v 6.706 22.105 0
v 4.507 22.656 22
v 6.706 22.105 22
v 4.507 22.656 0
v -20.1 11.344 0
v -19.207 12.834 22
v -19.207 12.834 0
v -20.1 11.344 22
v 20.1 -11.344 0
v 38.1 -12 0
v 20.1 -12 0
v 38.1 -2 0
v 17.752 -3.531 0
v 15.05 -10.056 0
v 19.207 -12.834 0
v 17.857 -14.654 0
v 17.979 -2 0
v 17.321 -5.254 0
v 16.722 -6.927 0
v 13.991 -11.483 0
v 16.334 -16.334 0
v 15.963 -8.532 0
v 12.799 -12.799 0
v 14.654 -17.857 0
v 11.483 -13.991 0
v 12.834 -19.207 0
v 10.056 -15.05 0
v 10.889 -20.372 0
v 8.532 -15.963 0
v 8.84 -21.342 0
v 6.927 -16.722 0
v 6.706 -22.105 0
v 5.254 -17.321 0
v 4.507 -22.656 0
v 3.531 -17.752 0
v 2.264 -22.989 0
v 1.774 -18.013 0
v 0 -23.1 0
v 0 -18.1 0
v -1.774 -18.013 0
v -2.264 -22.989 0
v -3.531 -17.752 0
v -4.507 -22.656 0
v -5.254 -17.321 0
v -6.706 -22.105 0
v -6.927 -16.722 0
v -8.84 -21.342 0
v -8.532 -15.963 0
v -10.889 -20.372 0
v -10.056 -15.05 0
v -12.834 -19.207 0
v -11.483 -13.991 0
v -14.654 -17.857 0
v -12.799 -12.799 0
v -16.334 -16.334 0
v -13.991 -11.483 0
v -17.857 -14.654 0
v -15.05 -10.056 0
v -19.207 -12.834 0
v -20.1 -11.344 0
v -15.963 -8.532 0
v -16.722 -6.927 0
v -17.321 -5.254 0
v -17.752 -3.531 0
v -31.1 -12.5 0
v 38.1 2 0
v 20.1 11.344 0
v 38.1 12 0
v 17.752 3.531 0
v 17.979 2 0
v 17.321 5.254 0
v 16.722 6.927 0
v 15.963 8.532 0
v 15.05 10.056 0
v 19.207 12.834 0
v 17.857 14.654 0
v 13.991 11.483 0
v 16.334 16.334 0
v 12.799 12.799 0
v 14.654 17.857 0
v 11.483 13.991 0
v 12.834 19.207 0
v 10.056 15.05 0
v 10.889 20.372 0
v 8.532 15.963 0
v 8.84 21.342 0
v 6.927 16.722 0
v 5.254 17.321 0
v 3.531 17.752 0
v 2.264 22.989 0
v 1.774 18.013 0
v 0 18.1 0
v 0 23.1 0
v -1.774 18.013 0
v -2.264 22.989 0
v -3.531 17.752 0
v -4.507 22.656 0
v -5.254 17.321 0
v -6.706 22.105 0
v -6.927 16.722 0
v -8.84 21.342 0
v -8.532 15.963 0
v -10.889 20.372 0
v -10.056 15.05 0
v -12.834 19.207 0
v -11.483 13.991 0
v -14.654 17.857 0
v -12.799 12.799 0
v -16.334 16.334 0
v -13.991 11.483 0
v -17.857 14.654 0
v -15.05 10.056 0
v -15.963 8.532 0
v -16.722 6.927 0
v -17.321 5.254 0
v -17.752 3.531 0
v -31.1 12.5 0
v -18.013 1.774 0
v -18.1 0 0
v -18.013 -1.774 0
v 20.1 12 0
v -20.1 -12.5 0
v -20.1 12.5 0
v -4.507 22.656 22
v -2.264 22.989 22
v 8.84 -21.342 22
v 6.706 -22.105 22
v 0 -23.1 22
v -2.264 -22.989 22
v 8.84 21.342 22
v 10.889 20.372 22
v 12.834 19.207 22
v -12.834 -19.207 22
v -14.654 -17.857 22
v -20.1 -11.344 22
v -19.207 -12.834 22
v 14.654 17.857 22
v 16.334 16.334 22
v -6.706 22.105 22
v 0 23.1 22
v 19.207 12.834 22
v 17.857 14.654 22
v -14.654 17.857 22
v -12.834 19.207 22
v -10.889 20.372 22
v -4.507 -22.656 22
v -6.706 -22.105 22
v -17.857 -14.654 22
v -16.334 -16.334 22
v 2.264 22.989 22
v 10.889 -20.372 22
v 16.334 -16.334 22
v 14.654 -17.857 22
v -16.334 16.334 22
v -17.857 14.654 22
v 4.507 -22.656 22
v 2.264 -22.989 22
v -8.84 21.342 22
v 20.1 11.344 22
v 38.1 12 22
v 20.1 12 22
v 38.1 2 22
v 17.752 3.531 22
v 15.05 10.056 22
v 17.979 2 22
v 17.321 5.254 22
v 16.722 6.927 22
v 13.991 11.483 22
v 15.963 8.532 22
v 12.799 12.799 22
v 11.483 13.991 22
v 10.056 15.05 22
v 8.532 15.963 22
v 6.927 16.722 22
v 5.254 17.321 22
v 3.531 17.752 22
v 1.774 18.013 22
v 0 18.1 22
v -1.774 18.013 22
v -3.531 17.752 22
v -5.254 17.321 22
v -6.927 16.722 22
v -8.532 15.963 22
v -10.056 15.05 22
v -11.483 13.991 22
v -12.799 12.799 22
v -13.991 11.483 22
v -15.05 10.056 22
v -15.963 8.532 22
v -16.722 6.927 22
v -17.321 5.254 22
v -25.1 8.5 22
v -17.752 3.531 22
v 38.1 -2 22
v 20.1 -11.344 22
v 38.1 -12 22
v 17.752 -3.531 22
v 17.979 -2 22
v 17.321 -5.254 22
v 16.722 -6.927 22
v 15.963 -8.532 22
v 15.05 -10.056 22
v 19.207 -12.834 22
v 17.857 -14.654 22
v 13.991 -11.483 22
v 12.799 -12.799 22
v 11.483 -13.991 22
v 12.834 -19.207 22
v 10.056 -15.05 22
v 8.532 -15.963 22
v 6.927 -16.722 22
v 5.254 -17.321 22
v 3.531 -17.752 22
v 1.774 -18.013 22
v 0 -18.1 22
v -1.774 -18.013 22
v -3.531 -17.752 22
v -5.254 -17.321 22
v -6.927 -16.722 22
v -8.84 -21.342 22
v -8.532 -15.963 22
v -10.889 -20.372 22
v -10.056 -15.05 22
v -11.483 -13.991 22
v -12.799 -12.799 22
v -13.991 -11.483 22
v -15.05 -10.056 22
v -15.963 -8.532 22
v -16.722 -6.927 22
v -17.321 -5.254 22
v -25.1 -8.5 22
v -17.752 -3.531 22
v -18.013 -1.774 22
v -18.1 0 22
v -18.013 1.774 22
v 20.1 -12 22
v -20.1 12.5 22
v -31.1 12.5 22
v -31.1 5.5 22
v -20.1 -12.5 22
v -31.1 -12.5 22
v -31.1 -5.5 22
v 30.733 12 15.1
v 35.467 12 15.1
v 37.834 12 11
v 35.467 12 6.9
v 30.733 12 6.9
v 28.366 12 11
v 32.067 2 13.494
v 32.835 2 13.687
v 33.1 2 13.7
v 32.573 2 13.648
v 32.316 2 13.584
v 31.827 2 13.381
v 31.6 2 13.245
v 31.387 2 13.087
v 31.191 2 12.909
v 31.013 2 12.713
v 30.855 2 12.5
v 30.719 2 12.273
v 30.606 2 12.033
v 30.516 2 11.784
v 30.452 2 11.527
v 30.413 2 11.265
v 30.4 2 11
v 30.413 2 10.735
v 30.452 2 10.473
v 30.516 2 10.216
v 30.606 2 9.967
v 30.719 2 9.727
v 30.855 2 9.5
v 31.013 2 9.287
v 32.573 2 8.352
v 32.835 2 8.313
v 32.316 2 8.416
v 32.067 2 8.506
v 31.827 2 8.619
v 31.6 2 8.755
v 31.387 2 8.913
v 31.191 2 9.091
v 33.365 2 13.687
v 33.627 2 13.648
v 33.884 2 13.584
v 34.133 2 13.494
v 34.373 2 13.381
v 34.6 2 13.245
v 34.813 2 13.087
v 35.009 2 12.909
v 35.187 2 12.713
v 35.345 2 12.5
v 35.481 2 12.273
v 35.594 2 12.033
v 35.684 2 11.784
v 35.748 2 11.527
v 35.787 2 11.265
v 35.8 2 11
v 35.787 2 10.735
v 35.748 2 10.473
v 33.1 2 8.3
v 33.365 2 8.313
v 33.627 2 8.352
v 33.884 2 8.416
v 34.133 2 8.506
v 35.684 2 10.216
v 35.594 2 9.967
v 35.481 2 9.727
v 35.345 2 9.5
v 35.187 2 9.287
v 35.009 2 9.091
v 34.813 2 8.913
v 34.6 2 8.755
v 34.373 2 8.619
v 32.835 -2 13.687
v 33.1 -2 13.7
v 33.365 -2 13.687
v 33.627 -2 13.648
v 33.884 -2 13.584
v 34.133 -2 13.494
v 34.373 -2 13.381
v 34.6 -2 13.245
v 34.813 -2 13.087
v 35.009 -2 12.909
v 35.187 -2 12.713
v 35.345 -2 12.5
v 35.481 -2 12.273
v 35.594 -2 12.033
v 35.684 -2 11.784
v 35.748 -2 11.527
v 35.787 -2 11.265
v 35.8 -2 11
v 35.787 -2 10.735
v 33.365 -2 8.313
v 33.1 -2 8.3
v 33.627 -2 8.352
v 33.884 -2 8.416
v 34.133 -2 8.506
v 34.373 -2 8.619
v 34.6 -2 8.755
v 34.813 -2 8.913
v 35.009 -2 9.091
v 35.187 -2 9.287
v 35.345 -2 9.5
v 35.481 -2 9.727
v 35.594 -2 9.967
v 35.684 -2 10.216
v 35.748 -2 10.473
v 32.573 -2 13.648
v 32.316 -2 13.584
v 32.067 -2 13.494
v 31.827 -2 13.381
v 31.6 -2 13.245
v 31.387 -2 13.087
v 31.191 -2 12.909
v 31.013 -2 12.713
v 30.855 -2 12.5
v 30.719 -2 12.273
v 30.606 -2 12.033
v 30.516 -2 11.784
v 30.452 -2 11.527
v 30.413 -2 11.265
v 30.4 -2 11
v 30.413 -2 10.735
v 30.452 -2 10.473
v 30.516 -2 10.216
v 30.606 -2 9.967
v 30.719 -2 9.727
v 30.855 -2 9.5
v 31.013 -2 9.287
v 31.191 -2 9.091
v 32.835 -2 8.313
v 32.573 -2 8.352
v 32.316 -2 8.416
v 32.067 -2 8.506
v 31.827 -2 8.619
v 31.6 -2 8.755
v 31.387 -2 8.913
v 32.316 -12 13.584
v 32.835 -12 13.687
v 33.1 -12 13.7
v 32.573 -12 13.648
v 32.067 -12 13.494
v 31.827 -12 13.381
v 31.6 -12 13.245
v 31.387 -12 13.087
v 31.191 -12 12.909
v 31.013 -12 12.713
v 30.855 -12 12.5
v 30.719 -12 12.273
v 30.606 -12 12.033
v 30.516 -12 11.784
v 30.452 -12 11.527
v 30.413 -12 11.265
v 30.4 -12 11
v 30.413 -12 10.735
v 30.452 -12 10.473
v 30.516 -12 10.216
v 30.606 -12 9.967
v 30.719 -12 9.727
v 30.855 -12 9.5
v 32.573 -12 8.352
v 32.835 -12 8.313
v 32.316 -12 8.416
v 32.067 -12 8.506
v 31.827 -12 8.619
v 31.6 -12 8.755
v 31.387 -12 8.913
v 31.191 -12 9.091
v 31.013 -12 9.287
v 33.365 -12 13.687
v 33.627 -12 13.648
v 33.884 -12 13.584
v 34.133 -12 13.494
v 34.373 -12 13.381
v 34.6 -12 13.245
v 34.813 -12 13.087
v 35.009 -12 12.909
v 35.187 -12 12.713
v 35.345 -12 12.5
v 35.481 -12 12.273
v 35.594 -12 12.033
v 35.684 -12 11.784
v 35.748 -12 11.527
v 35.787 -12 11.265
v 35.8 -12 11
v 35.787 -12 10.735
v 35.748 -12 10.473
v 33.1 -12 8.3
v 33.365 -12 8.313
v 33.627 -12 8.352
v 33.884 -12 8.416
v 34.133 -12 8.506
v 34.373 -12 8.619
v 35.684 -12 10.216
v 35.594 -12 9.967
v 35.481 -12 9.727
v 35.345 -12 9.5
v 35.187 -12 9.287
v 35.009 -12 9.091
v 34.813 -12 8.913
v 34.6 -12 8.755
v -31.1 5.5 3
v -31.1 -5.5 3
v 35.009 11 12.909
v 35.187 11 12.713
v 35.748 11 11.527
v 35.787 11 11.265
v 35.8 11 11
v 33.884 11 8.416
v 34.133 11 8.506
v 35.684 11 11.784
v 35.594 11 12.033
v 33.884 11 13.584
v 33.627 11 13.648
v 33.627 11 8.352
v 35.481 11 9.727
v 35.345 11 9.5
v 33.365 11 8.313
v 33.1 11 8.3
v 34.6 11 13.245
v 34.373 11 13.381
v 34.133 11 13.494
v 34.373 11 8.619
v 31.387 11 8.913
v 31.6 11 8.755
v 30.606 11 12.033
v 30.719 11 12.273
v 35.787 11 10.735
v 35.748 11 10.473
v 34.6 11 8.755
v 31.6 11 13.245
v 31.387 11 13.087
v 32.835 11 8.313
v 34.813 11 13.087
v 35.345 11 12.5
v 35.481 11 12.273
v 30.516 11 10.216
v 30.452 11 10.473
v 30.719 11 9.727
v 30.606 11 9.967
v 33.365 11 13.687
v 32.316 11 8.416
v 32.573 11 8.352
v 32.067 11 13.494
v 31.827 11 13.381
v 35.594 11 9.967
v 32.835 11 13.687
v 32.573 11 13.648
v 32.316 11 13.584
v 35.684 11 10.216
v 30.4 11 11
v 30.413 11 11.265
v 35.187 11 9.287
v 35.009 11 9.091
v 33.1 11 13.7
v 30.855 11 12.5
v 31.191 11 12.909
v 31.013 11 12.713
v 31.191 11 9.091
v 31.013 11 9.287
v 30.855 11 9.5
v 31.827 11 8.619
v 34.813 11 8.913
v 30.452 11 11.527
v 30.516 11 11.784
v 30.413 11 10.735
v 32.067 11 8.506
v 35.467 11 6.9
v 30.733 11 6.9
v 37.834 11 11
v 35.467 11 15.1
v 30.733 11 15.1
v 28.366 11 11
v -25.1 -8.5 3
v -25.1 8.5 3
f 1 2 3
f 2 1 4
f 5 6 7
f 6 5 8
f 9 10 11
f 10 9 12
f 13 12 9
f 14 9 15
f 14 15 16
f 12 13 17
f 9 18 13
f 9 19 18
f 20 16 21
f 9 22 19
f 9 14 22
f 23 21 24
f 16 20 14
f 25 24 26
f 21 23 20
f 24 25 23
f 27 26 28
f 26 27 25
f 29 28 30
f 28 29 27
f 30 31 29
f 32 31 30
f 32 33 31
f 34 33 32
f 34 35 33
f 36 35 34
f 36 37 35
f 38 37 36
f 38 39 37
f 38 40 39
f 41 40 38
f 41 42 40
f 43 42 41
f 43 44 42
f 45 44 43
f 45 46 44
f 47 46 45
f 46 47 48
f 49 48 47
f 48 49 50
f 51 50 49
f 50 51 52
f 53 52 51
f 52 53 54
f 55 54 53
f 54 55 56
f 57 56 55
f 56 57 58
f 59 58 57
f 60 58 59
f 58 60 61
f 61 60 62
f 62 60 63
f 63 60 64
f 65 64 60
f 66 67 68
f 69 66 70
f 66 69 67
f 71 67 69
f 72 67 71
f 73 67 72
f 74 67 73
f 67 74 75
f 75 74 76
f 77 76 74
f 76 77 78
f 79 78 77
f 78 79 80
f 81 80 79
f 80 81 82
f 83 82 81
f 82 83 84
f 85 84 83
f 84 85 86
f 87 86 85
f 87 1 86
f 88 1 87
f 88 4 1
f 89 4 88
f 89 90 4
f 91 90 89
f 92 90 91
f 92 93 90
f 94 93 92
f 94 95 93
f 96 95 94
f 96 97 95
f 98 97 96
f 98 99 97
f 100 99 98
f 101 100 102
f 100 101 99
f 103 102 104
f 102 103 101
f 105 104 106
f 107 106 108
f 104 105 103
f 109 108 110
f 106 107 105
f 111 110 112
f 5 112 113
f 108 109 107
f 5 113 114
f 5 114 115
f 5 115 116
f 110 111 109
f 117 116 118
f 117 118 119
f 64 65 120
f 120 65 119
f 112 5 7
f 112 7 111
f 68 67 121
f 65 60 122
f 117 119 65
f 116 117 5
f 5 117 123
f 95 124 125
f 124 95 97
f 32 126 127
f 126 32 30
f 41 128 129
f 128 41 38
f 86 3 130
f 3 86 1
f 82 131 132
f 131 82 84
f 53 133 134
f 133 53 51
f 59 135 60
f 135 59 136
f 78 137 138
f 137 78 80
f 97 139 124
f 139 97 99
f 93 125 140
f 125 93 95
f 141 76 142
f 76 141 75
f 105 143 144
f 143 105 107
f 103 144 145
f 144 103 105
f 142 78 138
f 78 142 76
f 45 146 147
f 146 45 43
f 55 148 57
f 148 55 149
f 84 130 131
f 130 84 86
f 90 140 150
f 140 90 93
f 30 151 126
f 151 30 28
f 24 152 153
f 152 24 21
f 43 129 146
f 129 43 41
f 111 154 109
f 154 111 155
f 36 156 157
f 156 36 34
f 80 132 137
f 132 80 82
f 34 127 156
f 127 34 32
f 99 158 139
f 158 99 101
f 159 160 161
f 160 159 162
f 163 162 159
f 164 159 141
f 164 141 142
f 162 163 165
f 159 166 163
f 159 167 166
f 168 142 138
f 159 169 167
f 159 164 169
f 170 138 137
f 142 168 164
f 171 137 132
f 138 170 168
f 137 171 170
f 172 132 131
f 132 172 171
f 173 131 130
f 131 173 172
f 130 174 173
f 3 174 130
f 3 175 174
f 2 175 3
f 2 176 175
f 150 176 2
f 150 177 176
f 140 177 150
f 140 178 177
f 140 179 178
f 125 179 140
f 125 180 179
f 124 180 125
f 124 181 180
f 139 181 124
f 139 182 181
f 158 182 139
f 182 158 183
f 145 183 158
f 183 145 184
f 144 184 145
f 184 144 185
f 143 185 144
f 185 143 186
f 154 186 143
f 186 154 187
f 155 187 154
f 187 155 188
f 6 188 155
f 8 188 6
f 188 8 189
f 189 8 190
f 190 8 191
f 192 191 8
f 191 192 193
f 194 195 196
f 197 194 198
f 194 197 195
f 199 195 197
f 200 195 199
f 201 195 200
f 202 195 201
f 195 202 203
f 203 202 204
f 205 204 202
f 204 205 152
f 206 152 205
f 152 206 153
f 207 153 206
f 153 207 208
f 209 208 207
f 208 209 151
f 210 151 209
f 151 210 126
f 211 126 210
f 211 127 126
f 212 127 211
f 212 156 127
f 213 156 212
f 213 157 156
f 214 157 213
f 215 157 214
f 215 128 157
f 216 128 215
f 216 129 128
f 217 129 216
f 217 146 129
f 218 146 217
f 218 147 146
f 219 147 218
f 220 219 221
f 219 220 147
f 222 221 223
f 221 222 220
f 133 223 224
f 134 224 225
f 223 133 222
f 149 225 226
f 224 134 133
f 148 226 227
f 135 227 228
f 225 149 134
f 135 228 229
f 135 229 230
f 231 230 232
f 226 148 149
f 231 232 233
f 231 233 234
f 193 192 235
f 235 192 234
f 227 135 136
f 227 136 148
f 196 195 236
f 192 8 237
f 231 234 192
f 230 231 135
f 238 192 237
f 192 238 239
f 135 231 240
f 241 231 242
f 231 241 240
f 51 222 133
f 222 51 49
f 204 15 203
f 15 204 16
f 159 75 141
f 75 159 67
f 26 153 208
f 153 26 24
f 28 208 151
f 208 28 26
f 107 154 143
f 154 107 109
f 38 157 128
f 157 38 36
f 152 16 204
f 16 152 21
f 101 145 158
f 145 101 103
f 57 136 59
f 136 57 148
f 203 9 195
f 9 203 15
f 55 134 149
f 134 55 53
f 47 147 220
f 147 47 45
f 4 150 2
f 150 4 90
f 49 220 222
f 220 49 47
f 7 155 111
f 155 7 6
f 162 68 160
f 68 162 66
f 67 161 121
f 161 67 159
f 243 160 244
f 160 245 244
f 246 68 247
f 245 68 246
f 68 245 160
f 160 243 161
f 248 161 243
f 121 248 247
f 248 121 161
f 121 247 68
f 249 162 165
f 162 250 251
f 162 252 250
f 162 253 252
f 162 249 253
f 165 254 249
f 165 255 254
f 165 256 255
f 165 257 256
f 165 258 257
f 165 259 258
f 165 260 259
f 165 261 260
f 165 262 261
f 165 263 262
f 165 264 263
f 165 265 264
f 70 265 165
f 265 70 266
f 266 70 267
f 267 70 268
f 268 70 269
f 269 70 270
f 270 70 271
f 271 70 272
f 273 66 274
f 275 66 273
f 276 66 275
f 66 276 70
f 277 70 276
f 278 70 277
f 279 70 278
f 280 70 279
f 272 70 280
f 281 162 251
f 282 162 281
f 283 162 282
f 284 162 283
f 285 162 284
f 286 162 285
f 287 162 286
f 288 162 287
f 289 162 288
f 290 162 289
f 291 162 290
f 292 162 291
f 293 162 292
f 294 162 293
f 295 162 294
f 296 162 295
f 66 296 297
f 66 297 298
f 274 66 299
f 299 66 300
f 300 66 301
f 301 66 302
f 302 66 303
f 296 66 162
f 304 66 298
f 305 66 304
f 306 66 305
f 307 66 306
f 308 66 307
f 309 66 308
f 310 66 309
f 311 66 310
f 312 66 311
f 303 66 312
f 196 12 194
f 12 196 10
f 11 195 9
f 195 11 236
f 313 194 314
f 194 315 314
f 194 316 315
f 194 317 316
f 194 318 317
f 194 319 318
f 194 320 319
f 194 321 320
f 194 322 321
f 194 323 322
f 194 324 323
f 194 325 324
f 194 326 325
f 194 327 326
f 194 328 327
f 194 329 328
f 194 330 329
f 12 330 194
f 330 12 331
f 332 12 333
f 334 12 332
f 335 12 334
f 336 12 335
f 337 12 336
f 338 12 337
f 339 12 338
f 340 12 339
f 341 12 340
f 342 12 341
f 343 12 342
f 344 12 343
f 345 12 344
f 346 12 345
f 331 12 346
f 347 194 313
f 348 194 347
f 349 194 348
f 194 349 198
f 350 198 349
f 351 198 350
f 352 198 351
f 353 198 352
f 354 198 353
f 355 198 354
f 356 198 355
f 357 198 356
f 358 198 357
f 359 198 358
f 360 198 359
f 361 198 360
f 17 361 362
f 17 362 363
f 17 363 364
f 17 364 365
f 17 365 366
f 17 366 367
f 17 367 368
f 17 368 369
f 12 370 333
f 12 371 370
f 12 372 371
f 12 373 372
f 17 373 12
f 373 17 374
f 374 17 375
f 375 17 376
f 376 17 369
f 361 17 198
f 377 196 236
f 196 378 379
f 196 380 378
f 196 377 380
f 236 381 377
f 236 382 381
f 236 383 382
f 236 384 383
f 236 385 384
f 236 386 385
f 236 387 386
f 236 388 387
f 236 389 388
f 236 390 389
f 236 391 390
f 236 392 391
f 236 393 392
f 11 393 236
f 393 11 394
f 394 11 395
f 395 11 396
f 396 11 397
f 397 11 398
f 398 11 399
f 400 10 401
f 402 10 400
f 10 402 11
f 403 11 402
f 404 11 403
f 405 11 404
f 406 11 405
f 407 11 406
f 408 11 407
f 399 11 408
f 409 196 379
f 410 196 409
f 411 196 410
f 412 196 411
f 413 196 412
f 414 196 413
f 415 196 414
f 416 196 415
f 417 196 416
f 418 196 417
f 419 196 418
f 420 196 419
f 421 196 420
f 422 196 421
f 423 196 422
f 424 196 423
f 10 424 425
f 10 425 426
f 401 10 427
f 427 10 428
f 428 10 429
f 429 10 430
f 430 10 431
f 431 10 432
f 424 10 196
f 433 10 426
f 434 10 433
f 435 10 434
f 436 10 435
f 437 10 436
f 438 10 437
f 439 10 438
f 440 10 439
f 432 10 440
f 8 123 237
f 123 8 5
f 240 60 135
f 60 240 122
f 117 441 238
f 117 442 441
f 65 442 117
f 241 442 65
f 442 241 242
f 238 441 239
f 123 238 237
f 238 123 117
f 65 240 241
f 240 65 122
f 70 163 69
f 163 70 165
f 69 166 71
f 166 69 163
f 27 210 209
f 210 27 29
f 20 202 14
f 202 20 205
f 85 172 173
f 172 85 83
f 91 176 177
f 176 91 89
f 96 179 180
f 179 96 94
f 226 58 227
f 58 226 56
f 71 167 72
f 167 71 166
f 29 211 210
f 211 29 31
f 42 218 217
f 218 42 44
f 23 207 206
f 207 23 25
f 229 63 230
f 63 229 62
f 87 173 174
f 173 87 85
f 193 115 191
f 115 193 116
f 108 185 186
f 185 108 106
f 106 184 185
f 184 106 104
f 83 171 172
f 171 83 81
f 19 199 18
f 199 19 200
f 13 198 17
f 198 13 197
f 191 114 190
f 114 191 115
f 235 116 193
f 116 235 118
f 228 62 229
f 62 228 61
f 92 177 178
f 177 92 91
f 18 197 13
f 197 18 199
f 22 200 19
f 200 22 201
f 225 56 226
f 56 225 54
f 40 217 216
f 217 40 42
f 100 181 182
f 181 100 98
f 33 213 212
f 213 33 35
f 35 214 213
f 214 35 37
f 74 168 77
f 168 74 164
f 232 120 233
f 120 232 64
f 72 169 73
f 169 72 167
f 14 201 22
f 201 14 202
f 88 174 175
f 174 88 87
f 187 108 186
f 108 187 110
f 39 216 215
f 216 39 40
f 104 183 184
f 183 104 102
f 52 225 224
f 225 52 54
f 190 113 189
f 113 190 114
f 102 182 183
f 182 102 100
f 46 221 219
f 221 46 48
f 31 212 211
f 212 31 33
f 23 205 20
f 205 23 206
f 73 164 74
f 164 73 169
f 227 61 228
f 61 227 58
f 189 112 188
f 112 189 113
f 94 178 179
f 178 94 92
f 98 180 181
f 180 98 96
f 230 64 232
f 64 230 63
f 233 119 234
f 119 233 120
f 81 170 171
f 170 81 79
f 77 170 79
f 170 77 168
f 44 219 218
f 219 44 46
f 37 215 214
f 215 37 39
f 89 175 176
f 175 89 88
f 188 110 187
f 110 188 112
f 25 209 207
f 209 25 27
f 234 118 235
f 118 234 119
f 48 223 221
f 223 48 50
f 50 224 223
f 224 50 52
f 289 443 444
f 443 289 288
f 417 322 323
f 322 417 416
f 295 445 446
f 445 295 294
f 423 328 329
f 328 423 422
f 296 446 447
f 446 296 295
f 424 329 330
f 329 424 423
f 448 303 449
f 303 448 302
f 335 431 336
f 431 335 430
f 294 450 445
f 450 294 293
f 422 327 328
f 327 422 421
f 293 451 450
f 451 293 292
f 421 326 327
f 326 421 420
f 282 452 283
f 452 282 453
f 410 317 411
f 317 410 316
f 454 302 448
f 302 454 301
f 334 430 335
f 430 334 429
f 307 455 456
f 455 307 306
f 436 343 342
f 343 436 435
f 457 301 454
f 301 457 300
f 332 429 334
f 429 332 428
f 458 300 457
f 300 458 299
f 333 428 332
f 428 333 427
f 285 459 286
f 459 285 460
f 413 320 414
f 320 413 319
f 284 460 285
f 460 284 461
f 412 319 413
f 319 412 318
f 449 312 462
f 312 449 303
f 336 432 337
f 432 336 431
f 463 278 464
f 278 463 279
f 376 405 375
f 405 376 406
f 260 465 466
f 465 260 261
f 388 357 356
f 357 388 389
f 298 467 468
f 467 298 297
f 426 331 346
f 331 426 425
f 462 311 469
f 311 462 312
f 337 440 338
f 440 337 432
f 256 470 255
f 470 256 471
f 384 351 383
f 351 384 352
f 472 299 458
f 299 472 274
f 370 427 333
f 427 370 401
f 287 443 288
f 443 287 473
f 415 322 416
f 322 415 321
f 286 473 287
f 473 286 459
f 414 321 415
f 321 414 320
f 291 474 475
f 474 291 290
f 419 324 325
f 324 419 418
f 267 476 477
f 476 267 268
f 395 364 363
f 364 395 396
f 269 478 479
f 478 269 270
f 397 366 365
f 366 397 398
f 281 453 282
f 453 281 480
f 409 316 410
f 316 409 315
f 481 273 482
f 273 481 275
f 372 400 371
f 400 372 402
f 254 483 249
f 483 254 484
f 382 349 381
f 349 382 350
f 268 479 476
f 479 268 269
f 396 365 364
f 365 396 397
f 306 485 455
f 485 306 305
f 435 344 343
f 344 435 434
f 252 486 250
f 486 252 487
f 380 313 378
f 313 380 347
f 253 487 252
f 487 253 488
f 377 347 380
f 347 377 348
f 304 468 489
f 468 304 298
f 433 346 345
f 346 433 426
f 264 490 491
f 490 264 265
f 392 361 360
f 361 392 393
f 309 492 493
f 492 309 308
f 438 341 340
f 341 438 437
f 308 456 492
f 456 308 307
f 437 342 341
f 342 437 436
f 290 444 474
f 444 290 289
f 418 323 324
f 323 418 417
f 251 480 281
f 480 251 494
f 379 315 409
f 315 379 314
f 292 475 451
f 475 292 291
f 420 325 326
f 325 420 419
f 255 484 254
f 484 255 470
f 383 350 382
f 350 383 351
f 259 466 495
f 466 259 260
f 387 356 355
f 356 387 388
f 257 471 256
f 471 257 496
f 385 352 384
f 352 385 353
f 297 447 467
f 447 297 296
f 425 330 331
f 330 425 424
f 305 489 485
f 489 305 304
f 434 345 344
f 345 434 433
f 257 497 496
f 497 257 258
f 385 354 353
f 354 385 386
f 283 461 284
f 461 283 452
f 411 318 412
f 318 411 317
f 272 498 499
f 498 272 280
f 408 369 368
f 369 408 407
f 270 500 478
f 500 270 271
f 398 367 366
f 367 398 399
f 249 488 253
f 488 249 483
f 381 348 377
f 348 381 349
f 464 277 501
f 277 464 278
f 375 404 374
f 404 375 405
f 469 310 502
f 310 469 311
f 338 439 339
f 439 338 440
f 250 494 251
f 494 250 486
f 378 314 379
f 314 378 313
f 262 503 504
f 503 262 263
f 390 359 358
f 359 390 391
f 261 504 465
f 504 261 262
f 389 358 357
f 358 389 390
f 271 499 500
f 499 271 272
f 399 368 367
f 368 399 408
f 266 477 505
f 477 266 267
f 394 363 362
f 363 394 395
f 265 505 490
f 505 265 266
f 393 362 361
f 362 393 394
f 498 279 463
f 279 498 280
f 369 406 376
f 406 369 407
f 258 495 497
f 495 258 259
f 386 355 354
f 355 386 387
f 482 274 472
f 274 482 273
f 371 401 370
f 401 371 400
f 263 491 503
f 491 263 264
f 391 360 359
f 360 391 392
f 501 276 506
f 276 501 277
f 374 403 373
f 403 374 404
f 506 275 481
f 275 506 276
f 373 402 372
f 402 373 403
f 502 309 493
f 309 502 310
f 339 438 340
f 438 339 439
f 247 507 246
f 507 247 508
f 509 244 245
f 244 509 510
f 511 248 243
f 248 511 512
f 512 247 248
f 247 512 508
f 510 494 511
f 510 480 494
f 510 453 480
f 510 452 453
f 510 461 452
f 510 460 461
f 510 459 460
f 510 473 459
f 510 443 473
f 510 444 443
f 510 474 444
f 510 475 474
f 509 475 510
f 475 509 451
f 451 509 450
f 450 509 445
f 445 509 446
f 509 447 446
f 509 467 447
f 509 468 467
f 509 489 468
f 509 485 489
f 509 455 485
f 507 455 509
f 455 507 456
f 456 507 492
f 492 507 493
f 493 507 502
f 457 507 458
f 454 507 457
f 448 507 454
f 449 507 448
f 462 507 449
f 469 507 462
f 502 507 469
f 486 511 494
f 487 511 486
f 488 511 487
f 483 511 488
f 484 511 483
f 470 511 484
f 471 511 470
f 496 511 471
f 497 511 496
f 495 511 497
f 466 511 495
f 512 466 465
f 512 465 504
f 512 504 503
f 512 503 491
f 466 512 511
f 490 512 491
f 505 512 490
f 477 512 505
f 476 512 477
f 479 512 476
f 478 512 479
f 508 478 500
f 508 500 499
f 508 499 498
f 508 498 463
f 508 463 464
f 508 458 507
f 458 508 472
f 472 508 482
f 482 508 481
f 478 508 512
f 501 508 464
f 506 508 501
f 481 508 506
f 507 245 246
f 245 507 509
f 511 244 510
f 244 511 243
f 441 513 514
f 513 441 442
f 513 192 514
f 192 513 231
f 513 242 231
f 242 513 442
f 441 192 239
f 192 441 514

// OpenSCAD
// file: stand_cable_clamp_common.scad
// stand_cable_clamp_common.scad — modular cable clamp for round stand poles.
//
// A split C-clamp pops over the pole and an M5 bolt + wingnut cinches it tight
// (the bolt head is captured in a hex pocket, so you only turn the wingnut —
// tool-free reposition). A dovetail on the clamp face takes slide-on cable
// heads, so one clamp accepts any attachment.
//
//   clamp(tube_d)   — the pole clamp (set tube_d to your pole OD)
//   head_hook()     — open J-hook
//   head_clip()     — snap cable clip
//   head_comb()     — multi-cable comb
//   head_velcro()   — velcro-strap slot
//
// On-Stage SS8800B+ upper shaft = 34.9 mm (1⅜") or 38.1 mm (1½" w/ sleeve).
// Measure the crank-up column for a wider variant.

TUBE_D = 35;        // pole outer diameter (set per stand)
CLEAR  = 0.6;       // clamp bore clearance
WALL   = 5;         // clamp wall
H      = 22;        // clamp height (along the pole)
GAP    = 4;         // split-gap width
EAR_L  = 18; EAR_W = 10;
BOLT_D = 5.4;       // M5 clearance
HEX_AF = 8.2;       // M5 hex head/nut across-flats (capture pocket)
HEX_T  = 4.5;

// dovetail (undercut: mouth narrower than back so the head can't pull out)
DT_MOUTH = 11; DT_BACK = 17; DT_DEPTH = 6; DT_H = 18; DT_STOP = 3; DT_CLEAR = 0.5;
CABLE_D = 8;        // nominal cable diameter for clip/comb

$fn = 64;

// dovetail solid: mouth (narrow) at x=0 facing -X, widening to back at x=depth, extruded up Z
module dt_prism(mouth, back, depth, h) {
    linear_extrude(h) polygon([[0, -mouth/2], [0, mouth/2], [depth, back/2], [depth, -back/2]]);
}
module dt_tongue() { dt_prism(DT_MOUTH - DT_CLEAR, DT_BACK - DT_CLEAR, DT_DEPTH - 0.3, DT_H); }

// ---- clamp ----
module clamp(tube_d = TUBE_D) {
    ir = tube_d / 2 + CLEAR; orr = ir + WALL;
    boss_x = -orr - DT_DEPTH - 2;        // -X outer face of the dovetail boss
    difference() {
        union() {
            cylinder(h = H, r = orr);
            translate([orr - 3, GAP / 2, 0]) cube([EAR_L, EAR_W, H]);            // +Y ear
            translate([orr - 3, -GAP / 2 - EAR_W, 0]) cube([EAR_L, EAR_W, H]);   // -Y ear
            translate([boss_x, -(DT_BACK / 2 + 4), 0]) cube([DT_DEPTH + 5, DT_BACK + 8, H]); // dovetail boss
        }
        translate([0, 0, 0]) cylinder(h = 3 * H, r = ir, center = true);         // bore
        translate([0, -GAP / 2, -1]) cube([orr + EAR_L + 5, GAP, H + 2]);        // split slot
        // wingnut bolt through the ears (along Y)
        translate([orr + EAR_L - 8, GAP / 2 + EAR_W + 3, H / 2]) rotate([90, 0, 0]) cylinder(h = 2 * EAR_W + GAP + 8, d = BOLT_D);
        // hex pocket captures the bolt head on the +Y ear outer face
        translate([orr + EAR_L - 8, GAP / 2 + EAR_W + HEX_T, H / 2]) rotate([90, 0, 0]) cylinder(h = HEX_T + 1, d = HEX_AF / cos(30), $fn = 6);
        // dovetail socket groove (open top, solid below DT_STOP as a slide stop)
        translate([boss_x, 0, DT_STOP]) dt_prism(DT_MOUTH, DT_BACK, DT_DEPTH, H);
    }
}

// ---- heads (universal; mount via the dovetail tongue at x=0..DT_DEPTH) ----
module _backplate(t = 4) { translate([-t, -DT_BACK / 2, 0]) cube([t, DT_BACK, DT_H]); }

module head_hook() {
    dt_tongue(); _backplate();
    translate([-4, 0, DT_H / 2]) rotate([90, 0, 0])
        rotate_extrude(angle = 250) translate([16, 0]) circle(d = 7);
}
module head_clip(clip_w = 12) {
    dt_tongue(); _backplate();
    // C-clip (vertical cable), ring connects to the backplate on +X, mouth opens -X
    ring_out = CABLE_D + 5;
    translate([-4 - ring_out / 2 + 1.5, 0, (DT_H - clip_w) / 2])
        linear_extrude(clip_w) difference() {
            circle(d = ring_out);
            circle(d = CABLE_D + 0.7);
            translate([-ring_out, -(CABLE_D - 1.5) / 2]) square([ring_out, CABLE_D - 1.5]); // snap mouth (-X)
        }
}
module head_comb(n = 4) {
    dt_tongue(); _backplate();
    bar_w = n * (CABLE_D + 3) + 3;
    translate([-4 - 8, -bar_w / 2, 0]) difference() {
        cube([10, bar_w, DT_H]);
        for (i = [0 : n - 1]) translate([-1, 3 + i * (CABLE_D + 3) + CABLE_D / 2, DT_H]) rotate([0, 90, 0]) cylinder(d = CABLE_D, h = 12); // open-top slots
        for (i = [0 : n - 1]) translate([-1, 3 + i * (CABLE_D + 3) + CABLE_D / 2, DT_H - CABLE_D / 2]) cube([12, CABLE_D, CABLE_D]);
    }
}
module head_velcro(strap_w = 25, strap_t = 3) {
    dt_tongue(); _backplate();
    translate([-4 - 6, -(strap_w + 8) / 2, 0]) difference() {
        cube([6, strap_w + 8, DT_H]);
        translate([-1, 4, DT_H / 2 - strap_t / 2]) cube([8, strap_w, strap_t]); // strap thru-slot
    }
}
// main file
// clamp — split C-clamp for a round stand pole (set tube_d to your pole OD).
// On-Stage SS8800B+ shaft = 35 mm; change tube_d for other tubes (e.g. column).
include <stand_cable_clamp_common.scad>
clamp(tube_d = 35);
